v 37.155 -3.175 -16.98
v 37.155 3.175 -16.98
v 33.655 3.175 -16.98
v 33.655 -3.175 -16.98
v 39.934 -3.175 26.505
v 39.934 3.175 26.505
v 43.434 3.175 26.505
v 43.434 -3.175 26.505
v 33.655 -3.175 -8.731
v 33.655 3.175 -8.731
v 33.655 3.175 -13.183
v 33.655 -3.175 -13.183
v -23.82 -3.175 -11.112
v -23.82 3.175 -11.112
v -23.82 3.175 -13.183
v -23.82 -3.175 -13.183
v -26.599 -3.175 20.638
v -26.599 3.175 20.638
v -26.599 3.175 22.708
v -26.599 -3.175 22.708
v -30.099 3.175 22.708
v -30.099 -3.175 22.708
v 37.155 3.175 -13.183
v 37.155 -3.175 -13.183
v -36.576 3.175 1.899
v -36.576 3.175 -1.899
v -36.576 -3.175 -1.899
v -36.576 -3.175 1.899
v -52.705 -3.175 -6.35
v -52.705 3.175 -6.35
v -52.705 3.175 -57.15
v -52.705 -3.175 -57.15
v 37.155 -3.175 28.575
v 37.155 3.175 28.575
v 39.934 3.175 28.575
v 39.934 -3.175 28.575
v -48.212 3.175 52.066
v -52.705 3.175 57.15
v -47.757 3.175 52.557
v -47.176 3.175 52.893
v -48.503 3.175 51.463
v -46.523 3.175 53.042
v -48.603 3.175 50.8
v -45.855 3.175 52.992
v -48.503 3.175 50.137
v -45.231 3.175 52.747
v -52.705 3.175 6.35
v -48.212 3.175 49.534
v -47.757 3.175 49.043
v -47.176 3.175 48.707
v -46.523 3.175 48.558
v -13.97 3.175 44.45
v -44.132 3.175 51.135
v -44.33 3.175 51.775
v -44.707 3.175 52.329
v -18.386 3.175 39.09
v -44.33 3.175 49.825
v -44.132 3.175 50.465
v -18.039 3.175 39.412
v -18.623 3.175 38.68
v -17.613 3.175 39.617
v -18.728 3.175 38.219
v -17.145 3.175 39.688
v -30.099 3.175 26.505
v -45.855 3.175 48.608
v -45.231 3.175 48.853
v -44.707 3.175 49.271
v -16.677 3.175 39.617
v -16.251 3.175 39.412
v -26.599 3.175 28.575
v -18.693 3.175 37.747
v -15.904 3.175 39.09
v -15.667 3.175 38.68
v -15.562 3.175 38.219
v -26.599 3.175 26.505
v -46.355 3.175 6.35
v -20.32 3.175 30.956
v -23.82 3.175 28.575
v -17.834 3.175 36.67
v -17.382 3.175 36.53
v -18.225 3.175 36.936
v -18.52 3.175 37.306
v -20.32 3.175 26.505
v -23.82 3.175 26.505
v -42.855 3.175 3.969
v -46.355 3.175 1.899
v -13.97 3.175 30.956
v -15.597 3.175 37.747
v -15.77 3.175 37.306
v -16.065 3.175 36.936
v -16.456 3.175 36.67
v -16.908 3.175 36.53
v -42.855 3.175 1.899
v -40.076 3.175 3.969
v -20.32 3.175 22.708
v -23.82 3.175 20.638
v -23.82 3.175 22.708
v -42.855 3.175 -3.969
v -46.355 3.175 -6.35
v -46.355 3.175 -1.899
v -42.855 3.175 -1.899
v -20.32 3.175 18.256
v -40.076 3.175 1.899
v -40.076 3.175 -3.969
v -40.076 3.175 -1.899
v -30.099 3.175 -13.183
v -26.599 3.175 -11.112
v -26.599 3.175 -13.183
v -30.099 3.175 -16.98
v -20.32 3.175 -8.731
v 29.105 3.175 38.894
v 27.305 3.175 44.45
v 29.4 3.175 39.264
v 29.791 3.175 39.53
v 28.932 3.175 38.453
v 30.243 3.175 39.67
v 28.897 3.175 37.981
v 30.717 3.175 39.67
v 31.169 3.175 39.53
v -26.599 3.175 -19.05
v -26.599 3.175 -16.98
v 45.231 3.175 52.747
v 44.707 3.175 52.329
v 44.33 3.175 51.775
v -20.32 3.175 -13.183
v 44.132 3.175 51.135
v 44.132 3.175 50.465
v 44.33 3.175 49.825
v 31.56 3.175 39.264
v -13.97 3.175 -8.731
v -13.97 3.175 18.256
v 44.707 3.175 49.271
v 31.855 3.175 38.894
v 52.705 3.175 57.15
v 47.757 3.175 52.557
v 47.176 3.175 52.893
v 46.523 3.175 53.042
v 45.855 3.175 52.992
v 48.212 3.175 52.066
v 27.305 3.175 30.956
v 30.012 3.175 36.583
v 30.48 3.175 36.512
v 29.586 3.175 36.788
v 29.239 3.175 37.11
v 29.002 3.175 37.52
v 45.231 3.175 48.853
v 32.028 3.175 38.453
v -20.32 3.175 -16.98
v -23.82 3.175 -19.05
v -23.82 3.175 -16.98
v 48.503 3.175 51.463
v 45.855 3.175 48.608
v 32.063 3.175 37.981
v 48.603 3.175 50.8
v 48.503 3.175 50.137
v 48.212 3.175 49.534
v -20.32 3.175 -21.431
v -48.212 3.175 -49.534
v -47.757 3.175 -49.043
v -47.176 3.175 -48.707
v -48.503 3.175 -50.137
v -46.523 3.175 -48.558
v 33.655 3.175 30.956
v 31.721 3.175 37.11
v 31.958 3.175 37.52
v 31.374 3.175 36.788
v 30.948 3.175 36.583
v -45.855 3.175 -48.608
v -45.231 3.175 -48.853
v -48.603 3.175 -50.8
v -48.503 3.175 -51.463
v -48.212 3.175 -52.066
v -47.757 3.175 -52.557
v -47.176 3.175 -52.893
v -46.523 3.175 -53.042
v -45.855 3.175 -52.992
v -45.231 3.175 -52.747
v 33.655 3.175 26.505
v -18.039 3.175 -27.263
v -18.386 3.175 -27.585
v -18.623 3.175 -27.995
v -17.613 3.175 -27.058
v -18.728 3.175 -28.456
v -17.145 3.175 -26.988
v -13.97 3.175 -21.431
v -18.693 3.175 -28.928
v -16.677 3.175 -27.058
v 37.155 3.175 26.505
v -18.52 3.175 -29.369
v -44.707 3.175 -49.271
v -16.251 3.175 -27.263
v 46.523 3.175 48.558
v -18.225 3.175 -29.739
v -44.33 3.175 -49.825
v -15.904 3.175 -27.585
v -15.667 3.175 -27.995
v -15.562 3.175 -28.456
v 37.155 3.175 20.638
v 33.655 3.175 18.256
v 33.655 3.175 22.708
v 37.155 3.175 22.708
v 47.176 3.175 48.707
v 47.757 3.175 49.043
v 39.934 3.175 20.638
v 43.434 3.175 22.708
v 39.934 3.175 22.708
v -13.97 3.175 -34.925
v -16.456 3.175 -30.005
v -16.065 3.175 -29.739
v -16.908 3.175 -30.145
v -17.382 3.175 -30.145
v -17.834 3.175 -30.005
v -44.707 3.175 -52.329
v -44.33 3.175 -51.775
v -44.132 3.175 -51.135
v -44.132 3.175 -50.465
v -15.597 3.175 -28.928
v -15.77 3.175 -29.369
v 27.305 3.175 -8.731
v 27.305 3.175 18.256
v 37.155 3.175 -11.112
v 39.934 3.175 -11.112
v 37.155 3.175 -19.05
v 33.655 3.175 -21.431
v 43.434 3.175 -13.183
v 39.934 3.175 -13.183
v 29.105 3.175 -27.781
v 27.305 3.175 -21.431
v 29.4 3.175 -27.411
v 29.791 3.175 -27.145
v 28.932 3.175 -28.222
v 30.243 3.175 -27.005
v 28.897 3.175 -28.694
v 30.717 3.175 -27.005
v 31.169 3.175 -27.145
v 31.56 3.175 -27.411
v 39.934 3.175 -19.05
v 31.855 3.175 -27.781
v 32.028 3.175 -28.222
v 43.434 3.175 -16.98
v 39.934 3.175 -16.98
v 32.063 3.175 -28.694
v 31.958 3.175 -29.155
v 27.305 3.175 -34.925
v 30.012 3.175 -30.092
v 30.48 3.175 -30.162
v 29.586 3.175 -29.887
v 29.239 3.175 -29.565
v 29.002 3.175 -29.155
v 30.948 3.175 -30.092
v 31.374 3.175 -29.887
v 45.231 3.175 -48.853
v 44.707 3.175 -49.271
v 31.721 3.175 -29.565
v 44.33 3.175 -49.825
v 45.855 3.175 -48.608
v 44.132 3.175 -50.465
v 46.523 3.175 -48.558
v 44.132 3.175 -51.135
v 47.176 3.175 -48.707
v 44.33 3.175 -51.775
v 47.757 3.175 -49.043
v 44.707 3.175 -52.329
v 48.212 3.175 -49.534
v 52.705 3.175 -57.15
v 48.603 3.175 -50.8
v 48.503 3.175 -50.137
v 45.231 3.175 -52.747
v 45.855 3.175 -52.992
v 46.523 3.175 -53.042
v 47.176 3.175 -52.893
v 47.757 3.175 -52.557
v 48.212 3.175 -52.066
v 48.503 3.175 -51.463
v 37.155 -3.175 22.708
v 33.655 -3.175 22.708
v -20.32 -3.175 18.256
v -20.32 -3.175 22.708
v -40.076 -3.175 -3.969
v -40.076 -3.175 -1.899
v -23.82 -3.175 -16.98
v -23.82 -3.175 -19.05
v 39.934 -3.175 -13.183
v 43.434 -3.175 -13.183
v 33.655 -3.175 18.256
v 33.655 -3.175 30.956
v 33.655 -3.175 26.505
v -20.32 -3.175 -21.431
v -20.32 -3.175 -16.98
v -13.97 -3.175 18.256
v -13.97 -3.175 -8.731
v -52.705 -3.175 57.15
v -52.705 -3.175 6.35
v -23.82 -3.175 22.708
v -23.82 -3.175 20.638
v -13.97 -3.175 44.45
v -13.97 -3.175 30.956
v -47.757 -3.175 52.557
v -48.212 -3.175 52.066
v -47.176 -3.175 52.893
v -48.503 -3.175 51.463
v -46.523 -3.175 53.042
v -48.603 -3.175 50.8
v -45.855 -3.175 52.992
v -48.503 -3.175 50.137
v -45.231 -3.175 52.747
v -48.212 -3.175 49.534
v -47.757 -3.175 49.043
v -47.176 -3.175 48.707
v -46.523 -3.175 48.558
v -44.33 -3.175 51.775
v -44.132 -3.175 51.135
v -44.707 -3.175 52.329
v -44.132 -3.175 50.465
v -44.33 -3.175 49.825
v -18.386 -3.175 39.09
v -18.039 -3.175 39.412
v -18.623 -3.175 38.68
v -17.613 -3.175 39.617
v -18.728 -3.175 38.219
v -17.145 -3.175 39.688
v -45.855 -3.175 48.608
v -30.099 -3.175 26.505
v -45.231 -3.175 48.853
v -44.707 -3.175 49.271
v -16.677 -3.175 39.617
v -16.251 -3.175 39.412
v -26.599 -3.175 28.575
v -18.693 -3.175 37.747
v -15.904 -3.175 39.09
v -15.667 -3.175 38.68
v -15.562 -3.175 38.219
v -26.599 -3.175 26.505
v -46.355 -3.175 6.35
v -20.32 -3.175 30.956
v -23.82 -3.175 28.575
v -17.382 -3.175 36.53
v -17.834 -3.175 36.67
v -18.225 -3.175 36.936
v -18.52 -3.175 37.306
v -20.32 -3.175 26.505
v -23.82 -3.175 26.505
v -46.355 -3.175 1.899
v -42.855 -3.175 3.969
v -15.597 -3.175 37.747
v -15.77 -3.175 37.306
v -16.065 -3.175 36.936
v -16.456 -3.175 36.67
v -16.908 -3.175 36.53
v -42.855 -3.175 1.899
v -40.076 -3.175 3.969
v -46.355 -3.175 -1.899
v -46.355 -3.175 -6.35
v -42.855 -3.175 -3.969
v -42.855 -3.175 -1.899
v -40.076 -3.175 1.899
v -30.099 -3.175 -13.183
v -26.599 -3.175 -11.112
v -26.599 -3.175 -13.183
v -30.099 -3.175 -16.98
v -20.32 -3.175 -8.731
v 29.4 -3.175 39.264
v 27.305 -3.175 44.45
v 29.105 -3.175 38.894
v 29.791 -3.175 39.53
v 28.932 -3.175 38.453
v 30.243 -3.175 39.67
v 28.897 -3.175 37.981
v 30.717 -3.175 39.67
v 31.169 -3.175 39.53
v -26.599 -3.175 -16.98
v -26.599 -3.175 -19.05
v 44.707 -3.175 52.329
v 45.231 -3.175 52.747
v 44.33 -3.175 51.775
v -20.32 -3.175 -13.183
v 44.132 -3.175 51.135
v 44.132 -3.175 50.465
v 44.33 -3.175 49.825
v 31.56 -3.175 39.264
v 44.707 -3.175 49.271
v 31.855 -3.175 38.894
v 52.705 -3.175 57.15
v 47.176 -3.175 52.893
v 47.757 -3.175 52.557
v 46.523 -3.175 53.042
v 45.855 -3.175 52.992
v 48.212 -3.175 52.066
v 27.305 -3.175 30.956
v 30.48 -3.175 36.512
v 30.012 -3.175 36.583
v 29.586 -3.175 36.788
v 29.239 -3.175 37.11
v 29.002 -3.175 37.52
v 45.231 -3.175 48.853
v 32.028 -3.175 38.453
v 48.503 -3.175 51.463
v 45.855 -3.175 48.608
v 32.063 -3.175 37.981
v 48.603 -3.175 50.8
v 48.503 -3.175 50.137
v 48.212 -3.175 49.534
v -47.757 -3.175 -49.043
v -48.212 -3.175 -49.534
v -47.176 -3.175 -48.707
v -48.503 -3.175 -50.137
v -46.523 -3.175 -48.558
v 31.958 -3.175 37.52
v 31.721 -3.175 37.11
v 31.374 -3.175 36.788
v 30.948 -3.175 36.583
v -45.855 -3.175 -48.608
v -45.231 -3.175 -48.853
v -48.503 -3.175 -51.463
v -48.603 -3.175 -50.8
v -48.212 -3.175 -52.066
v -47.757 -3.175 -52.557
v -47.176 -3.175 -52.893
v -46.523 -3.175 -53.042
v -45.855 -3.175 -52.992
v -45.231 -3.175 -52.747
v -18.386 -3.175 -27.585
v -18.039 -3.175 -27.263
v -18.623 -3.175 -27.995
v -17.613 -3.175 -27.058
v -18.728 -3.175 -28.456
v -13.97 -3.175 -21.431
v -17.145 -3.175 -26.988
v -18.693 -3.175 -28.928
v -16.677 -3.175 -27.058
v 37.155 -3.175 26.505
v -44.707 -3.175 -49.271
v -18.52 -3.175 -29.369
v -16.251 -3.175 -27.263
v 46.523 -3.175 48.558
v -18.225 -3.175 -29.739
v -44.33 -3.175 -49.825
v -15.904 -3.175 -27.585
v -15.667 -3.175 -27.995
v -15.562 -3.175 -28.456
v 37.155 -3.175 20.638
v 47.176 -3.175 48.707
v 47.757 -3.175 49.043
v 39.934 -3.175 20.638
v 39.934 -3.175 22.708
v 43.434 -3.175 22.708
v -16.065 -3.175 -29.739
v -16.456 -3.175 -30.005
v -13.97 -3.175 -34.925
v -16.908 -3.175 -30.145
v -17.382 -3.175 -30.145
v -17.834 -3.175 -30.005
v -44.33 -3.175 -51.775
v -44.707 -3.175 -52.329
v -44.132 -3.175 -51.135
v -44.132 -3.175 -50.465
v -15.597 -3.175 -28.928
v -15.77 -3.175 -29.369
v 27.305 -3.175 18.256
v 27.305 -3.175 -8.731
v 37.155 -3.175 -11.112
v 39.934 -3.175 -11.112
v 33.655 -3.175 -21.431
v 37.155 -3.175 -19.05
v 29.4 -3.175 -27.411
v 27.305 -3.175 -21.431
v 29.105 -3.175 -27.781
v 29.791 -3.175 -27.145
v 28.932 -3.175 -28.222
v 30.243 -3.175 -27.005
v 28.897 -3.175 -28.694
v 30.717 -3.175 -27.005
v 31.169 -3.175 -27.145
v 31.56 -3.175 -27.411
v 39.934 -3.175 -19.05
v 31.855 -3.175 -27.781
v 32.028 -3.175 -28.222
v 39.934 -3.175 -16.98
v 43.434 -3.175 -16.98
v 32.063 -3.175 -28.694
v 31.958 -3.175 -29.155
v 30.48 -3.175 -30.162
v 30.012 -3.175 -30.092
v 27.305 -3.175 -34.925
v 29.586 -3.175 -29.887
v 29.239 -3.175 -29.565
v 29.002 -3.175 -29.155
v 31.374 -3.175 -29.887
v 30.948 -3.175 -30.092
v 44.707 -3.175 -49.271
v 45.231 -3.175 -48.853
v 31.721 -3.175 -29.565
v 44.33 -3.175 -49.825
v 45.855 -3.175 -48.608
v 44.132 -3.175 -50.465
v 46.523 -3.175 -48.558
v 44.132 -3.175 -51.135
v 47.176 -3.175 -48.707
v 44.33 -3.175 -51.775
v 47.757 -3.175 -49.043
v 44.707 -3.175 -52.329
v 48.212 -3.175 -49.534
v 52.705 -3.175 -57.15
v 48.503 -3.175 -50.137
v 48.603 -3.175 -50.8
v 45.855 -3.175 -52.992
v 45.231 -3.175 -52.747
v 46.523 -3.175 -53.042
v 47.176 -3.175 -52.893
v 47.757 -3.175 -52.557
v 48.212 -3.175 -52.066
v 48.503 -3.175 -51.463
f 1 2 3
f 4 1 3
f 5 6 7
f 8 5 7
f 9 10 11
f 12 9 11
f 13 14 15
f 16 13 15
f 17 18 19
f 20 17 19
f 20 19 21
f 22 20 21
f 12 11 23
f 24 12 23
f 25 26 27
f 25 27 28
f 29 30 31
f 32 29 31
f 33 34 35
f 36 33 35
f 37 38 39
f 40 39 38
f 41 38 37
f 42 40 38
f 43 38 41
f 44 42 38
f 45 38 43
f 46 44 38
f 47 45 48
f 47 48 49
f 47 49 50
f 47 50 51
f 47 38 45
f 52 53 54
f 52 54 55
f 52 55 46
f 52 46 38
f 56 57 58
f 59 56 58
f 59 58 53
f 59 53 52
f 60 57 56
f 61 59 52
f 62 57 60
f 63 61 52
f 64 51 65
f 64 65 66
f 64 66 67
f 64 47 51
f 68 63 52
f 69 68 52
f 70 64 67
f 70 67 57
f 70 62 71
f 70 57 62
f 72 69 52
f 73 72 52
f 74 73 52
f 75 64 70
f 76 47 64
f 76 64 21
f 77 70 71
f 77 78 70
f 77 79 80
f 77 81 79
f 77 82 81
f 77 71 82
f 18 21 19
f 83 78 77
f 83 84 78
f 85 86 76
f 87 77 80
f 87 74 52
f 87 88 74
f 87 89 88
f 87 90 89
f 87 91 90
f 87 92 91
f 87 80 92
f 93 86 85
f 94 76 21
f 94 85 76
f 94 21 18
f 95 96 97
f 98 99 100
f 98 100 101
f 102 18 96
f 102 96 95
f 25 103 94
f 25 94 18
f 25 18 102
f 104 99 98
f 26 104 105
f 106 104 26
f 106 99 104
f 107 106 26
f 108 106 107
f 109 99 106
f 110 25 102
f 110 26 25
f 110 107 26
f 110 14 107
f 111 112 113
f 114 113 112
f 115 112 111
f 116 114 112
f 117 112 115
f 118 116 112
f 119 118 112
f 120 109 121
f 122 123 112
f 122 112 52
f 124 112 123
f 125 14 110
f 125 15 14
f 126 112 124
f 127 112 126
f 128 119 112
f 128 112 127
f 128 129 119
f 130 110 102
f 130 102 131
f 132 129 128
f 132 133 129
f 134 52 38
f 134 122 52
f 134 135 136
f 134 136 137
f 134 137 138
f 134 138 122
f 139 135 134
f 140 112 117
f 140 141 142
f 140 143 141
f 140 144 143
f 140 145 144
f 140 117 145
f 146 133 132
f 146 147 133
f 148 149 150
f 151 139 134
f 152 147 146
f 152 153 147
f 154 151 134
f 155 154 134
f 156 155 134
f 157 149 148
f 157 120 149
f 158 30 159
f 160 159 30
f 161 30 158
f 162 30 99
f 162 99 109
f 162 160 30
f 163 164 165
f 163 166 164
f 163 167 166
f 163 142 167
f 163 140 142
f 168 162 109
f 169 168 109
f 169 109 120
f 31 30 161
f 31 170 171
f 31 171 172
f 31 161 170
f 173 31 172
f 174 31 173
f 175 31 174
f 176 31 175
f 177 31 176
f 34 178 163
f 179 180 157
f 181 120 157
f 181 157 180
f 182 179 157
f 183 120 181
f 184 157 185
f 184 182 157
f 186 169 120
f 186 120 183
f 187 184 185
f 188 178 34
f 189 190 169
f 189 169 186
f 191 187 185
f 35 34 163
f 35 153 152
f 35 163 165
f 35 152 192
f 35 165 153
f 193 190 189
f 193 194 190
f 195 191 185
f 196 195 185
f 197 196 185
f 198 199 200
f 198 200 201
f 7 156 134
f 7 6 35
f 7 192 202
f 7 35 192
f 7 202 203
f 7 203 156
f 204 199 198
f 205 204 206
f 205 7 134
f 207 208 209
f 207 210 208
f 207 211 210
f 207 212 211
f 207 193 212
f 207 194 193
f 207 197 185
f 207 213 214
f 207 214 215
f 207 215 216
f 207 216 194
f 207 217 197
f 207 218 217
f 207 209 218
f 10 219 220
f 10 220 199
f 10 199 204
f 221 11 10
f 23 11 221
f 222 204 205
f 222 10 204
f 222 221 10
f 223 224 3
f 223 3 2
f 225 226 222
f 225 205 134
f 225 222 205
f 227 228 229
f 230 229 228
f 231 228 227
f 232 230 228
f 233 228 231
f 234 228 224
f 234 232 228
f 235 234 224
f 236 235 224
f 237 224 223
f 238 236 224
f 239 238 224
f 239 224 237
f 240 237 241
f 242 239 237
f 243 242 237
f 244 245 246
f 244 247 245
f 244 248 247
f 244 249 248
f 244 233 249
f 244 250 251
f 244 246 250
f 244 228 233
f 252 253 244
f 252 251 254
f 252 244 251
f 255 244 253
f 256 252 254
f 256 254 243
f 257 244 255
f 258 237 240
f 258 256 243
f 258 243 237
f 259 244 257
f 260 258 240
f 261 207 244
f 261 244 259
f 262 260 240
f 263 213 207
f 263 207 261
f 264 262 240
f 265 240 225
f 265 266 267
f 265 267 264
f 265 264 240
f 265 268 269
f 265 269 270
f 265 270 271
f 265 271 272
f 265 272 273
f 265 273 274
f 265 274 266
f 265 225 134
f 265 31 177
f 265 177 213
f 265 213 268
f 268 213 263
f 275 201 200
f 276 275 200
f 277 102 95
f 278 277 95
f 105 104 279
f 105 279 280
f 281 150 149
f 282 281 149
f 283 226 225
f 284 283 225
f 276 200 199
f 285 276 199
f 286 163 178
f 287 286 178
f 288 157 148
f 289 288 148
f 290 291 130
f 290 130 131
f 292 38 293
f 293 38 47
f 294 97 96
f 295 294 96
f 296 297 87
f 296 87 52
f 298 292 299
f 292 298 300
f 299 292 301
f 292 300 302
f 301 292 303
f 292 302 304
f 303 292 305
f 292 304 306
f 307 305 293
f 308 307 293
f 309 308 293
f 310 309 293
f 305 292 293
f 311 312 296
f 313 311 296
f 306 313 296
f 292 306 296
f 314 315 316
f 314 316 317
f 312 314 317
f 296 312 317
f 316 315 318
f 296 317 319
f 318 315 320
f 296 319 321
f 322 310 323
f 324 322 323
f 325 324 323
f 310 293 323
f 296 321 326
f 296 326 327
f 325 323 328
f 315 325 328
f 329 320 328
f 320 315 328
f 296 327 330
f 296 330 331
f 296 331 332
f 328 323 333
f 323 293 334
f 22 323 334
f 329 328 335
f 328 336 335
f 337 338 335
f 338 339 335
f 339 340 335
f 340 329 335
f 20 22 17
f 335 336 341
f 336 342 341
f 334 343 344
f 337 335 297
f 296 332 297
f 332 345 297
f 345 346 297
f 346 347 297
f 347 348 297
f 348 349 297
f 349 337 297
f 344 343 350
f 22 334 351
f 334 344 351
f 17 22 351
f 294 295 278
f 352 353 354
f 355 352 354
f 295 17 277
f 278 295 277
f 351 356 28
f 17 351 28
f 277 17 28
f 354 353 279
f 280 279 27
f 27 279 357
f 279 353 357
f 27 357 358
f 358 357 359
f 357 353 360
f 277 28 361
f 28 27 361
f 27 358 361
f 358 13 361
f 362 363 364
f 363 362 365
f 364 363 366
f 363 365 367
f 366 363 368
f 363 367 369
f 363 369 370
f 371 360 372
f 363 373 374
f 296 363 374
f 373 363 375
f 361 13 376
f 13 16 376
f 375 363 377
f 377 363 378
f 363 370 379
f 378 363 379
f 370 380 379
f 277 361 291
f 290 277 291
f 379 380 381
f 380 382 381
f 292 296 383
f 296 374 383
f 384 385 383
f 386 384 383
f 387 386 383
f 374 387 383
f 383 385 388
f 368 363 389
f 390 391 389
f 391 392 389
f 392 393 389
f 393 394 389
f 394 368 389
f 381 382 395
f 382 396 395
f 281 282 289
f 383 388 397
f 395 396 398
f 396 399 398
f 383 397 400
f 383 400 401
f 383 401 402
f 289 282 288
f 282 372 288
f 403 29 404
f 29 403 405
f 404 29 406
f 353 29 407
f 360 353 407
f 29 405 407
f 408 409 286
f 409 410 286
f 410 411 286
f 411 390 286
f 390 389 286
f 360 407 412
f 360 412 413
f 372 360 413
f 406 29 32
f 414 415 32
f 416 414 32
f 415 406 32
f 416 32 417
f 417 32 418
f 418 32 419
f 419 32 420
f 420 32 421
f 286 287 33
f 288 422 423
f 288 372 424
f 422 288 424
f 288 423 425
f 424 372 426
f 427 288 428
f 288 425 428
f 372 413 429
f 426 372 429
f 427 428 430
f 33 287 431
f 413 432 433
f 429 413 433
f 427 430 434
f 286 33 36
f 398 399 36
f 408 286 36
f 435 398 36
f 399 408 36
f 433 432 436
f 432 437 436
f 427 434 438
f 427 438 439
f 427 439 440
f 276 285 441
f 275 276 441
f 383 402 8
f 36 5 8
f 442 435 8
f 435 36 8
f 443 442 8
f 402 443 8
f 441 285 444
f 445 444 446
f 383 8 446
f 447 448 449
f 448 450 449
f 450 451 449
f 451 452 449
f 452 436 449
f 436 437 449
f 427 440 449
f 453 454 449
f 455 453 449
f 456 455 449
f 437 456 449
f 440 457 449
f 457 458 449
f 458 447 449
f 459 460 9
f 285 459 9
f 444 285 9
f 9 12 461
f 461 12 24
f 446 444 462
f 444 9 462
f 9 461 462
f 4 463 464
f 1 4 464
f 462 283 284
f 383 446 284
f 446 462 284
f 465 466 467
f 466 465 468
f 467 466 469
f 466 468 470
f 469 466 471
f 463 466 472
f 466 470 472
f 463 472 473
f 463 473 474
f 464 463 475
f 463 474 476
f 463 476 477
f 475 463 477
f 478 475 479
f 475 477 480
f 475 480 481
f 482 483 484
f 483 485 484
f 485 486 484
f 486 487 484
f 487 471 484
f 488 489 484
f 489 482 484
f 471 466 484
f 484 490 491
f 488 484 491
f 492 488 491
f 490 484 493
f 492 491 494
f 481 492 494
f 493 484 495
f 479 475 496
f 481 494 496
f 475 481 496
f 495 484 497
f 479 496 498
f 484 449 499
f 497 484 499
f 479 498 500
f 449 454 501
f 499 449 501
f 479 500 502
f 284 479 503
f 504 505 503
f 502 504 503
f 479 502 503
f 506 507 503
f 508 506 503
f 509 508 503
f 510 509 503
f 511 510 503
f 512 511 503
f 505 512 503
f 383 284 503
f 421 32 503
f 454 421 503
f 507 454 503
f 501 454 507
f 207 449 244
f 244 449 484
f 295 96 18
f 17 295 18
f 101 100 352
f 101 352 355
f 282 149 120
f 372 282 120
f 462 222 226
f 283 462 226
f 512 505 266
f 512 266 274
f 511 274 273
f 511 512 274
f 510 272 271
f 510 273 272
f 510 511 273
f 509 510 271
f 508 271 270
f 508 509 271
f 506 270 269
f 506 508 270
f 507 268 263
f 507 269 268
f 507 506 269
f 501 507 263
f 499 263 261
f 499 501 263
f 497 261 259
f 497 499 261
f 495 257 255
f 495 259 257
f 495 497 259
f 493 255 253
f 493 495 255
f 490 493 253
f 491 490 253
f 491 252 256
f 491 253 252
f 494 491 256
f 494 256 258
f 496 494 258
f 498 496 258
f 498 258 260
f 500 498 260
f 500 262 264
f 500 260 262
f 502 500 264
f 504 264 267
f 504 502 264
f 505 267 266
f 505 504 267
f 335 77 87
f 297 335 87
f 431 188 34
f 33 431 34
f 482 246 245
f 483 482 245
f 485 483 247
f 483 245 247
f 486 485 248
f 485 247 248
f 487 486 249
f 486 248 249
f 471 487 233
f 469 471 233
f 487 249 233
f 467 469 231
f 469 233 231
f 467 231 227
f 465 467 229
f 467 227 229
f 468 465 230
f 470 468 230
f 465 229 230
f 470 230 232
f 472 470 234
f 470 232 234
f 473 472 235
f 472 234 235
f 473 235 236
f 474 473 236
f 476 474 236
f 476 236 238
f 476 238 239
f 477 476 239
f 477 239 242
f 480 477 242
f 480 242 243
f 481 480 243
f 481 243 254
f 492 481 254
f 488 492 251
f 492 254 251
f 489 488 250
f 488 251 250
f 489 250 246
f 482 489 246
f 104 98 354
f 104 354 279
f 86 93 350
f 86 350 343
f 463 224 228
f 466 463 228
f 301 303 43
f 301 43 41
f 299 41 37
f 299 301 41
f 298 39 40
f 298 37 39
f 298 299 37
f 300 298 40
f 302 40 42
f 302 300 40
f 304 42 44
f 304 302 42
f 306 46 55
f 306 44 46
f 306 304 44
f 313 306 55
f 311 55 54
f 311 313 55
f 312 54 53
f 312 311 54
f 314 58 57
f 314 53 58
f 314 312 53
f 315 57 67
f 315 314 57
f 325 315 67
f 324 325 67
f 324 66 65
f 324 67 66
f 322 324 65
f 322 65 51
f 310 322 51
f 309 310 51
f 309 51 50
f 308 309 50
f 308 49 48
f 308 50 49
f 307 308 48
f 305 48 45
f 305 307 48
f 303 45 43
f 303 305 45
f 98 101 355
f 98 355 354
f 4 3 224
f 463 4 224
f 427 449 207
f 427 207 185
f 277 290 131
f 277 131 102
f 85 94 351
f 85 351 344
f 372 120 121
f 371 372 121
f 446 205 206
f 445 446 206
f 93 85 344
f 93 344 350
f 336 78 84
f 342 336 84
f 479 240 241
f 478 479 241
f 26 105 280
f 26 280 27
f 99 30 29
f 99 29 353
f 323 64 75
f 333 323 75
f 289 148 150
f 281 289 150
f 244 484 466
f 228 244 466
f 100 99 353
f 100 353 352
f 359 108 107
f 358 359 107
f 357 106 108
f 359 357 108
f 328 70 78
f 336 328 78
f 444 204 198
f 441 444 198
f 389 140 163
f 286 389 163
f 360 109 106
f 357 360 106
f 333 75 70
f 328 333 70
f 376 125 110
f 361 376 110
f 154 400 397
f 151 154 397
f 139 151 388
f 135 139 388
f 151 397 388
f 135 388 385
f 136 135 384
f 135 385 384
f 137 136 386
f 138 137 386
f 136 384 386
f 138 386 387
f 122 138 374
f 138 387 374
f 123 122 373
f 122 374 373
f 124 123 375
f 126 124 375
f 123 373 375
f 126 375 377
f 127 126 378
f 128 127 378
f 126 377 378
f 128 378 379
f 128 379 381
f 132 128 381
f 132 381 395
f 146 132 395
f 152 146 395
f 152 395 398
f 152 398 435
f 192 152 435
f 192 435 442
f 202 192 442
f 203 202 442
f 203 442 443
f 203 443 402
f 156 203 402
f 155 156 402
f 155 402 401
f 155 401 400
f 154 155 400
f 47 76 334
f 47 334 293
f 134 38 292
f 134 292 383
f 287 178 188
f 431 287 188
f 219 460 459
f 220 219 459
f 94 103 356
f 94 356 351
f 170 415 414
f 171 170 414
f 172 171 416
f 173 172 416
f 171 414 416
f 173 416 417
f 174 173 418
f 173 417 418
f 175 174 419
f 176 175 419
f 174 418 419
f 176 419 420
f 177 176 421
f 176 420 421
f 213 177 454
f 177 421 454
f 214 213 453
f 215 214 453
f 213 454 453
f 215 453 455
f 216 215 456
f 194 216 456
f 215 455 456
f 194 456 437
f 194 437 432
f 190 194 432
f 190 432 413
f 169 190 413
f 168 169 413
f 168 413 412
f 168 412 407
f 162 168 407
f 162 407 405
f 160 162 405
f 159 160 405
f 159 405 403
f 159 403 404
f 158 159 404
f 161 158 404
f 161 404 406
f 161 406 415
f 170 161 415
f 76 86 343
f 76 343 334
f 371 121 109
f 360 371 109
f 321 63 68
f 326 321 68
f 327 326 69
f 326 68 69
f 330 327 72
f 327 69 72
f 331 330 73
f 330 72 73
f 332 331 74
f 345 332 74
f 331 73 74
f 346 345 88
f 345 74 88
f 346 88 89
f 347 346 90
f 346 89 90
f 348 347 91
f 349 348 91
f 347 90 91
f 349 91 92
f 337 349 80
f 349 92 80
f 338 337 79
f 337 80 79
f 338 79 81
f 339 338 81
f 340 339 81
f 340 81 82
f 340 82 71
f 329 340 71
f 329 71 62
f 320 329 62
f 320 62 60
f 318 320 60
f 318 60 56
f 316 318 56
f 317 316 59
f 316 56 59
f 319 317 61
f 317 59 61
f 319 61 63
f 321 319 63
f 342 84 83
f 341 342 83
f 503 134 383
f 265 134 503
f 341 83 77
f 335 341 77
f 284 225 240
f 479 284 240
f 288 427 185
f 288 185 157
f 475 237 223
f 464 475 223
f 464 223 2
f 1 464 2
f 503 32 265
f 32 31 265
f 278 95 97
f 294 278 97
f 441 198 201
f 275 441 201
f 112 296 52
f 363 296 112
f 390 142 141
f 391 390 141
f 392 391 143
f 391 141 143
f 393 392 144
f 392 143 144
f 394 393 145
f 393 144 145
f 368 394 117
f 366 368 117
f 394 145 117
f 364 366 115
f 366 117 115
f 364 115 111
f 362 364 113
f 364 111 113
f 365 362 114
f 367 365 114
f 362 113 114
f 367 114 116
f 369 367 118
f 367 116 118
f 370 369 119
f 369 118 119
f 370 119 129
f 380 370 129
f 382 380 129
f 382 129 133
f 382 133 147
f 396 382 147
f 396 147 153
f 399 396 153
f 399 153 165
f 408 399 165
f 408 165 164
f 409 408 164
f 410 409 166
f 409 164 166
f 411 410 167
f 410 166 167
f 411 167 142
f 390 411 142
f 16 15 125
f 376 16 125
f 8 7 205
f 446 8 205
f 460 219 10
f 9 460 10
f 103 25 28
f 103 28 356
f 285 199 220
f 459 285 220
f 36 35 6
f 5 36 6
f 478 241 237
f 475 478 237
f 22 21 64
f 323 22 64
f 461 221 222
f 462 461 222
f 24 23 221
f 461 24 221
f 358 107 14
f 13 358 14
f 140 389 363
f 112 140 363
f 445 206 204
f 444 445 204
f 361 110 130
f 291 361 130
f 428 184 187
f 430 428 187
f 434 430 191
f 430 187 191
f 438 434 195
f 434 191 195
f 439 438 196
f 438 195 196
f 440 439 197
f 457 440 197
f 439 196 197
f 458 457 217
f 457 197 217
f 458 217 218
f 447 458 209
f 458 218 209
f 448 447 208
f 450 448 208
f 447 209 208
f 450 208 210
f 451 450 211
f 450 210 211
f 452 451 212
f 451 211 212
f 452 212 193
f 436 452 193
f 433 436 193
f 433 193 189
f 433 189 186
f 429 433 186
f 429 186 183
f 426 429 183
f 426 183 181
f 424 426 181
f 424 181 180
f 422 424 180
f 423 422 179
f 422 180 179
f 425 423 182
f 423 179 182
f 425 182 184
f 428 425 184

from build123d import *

# Parameters (mm, degrees)
SKETCH1_W             = 105.41
SKETCH1_H             = 114.3
BOSS_EXTRUDE1_DEPTH   = 3.175
F_8_CLEARANCE_HOLE1_D = 4.4958
MIRROR2_COPY_1_D      = 4.4958
CUT_EXTRUDE4_REACH    = 80.002
SKETCH15_W            = 41.275
SKETCH15_H            = 79.375
CUT_EXTRUDE5_REACH    = 80.002
SKETCH17_R            = 1.5875
CUT_EXTRUDE6_DEPTH    = 6.35


with BuildPart() as part:
    # Sketch1 → Boss-Extrude1 (new, symmetric)
    with BuildSketch(Plane(origin=(0, 0, 0), x_dir=(1, 0, 0), z_dir=(0, 1, 0))):
        Rectangle(SKETCH1_W, SKETCH1_H)
    extrude(amount=BOSS_EXTRUDE1_DEPTH, both=True)

    # #8 Clearance Hole1 (through all)
    with Locations(Plane(origin=(0, 3.175, 0), x_dir=(1, 0, 0), z_dir=(0, 1, 0))):
        with Locations((-46.355, 50.8)):
            f_8_clearance_hole1 = Hole(F_8_CLEARANCE_HOLE1_D / 2)

    # Mirror1: #8 Clearance Hole1 across plane
    add(f_8_clearance_hole1.mirror(Plane.XY), mode=Mode.SUBTRACT)

    # Mirror2: #8 Clearance Hole1 across plane
    add(f_8_clearance_hole1.mirror(Plane(origin=(0, 0, 0), x_dir=(0, 0, 1), z_dir=(1, 0, 0))), mode=Mode.SUBTRACT)

    # Mirror2 copy 1 (through all)
    with Locations(Plane(origin=(0, 3.175, 0), x_dir=(-1, 0, 0), z_dir=(0, 1, 0))):
        with Locations((-46.355, 50.8)):
            Hole(MIRROR2_COPY_1_D / 2)

    # Sketch15 → Cut-Extrude4 (cut, up to next)
    with BuildSketch(Plane.XZ.offset(3.175), mode=Mode.PRIVATE) as cut_extrude4_sk1:
        with Locations((6.6675, 4.7625)):
            Rectangle(SKETCH15_W, SKETCH15_H)
    cut_extrude4_tool1 = extrude(cut_extrude4_sk1.sketch, amount=-CUT_EXTRUDE4_REACH, mode=Mode.PRIVATE) & part.part
    add(cut_extrude4_tool1.solids().sort_by_distance((6.6675, -3.175, 4.7625))[0], mode=Mode.SUBTRACT)

    # Sketch16 → Cut-Extrude5 (cut, up to next)
    with BuildSketch(Plane(origin=(0, 3.175, 0), x_dir=(1, 0, 0), z_dir=(0, 1, 0)), mode=Mode.PRIVATE) as cut_extrude5_sk1:
        Polygon((-52.705, -6.35), (-52.705, 6.35), (-46.355, 6.35), (-46.355, 1.89865), (-42.8545625, 1.89865), (-42.8545625, 3.96875), (-40.0764375, 3.96875), (-40.0764375, 1.89865), (-36.576, 1.89865), (-36.576, -1.89865), (-40.0764375, -1.89865), (-40.0764375, -3.96875), (-42.8545625, -3.96875), (-42.8545625, -1.89865), (-46.355, -1.89865), (-46.355, -6.35), align=None)
    cut_extrude5_tool1 = extrude(cut_extrude5_sk1.sketch, amount=-CUT_EXTRUDE5_REACH, mode=Mode.PRIVATE) & part.part
    add(cut_extrude5_tool1.solids().sort_by_distance((-46.496113, 3.175, 0))[0], mode=Mode.SUBTRACT)

    # Sketch17 → Cut-Extrude6 (cut)
    with BuildSketch(Plane(origin=(0, 3.175, 0), x_dir=(1, 0, 0), z_dir=(0, 1, 0))):
        with Locations(Location((-17.145, 28.575, 0), (0, 0, 270))):
            Circle(SKETCH17_R)
        with Locations(Location((-17.145, -38.1, 0), (0, 0, 270))):
            Circle(SKETCH17_R)
        with Locations(Location((30.48, -38.1, 0), (0, 0, 90))):
            Circle(SKETCH17_R)
        with Locations(Location((30.48, 28.575, 0), (0, 0, 90))):
            Circle(SKETCH17_R)
        Polygon((-20.32, 8.73125), (-13.97, 8.73125), (-13.97, 21.43125), (-20.32, 21.43125), (-20.32, 16.9799), (-23.8204375, 16.9799), (-23.8204375, 19.05), (-26.5985625, 19.05), (-26.5985625, 16.9799), (-30.099, 16.9799), (-30.099, 13.1826), (-26.5985625, 13.1826), (-26.5985625, 11.1125), (-23.8204375, 11.1125), (-23.8204375, 13.1826), (-20.32, 13.1826), align=None)
        Polygon((33.655, -18.25625), (27.305, -18.25625), (27.305, -30.95625), (33.655, -30.95625), (33.655, -26.5049), (37.1554375, -26.5049), (37.1554375, -28.575), (39.9335625, -28.575), (39.9335625, -26.5049), (43.434, -26.5049), (43.434, -22.7076), (39.9335625, -22.7076), (39.9335625, -20.6375), (37.1554375, -20.6375), (37.1554375, -22.7076), (33.655, -22.7076), align=None)
        Polygon((-20.32, -26.5049), (-20.32, -30.95625), (-13.97, -30.95625), (-13.97, -18.25625), (-20.32, -18.25625), (-20.32, -22.7076), (-23.8204375, -22.7076), (-23.8204375, -20.6375), (-26.5985625, -20.6375), (-26.5985625, -22.7076), (-30.099, -22.7076), (-30.099, -26.5049), (-26.5985625, -26.5049), (-26.5985625, -28.575), (-23.8204375, -28.575), (-23.8204375, -26.5049), align=None)
        Polygon((33.655, 16.9799), (33.655, 21.43125), (27.305, 21.43125), (27.305, 8.73125), (33.655, 8.73125), (33.655, 13.1826), (37.1554375, 13.1826), (37.1554375, 11.1125), (39.9335625, 11.1125), (39.9335625, 13.1826), (43.434, 13.1826), (43.434, 16.9799), (39.9335625, 16.9799), (39.9335625, 19.05), (37.1554375, 19.05), (37.1554375, 16.9799), align=None)
    extrude(amount=-CUT_EXTRUDE6_DEPTH, mode=Mode.SUBTRACT)


solid = part.part
